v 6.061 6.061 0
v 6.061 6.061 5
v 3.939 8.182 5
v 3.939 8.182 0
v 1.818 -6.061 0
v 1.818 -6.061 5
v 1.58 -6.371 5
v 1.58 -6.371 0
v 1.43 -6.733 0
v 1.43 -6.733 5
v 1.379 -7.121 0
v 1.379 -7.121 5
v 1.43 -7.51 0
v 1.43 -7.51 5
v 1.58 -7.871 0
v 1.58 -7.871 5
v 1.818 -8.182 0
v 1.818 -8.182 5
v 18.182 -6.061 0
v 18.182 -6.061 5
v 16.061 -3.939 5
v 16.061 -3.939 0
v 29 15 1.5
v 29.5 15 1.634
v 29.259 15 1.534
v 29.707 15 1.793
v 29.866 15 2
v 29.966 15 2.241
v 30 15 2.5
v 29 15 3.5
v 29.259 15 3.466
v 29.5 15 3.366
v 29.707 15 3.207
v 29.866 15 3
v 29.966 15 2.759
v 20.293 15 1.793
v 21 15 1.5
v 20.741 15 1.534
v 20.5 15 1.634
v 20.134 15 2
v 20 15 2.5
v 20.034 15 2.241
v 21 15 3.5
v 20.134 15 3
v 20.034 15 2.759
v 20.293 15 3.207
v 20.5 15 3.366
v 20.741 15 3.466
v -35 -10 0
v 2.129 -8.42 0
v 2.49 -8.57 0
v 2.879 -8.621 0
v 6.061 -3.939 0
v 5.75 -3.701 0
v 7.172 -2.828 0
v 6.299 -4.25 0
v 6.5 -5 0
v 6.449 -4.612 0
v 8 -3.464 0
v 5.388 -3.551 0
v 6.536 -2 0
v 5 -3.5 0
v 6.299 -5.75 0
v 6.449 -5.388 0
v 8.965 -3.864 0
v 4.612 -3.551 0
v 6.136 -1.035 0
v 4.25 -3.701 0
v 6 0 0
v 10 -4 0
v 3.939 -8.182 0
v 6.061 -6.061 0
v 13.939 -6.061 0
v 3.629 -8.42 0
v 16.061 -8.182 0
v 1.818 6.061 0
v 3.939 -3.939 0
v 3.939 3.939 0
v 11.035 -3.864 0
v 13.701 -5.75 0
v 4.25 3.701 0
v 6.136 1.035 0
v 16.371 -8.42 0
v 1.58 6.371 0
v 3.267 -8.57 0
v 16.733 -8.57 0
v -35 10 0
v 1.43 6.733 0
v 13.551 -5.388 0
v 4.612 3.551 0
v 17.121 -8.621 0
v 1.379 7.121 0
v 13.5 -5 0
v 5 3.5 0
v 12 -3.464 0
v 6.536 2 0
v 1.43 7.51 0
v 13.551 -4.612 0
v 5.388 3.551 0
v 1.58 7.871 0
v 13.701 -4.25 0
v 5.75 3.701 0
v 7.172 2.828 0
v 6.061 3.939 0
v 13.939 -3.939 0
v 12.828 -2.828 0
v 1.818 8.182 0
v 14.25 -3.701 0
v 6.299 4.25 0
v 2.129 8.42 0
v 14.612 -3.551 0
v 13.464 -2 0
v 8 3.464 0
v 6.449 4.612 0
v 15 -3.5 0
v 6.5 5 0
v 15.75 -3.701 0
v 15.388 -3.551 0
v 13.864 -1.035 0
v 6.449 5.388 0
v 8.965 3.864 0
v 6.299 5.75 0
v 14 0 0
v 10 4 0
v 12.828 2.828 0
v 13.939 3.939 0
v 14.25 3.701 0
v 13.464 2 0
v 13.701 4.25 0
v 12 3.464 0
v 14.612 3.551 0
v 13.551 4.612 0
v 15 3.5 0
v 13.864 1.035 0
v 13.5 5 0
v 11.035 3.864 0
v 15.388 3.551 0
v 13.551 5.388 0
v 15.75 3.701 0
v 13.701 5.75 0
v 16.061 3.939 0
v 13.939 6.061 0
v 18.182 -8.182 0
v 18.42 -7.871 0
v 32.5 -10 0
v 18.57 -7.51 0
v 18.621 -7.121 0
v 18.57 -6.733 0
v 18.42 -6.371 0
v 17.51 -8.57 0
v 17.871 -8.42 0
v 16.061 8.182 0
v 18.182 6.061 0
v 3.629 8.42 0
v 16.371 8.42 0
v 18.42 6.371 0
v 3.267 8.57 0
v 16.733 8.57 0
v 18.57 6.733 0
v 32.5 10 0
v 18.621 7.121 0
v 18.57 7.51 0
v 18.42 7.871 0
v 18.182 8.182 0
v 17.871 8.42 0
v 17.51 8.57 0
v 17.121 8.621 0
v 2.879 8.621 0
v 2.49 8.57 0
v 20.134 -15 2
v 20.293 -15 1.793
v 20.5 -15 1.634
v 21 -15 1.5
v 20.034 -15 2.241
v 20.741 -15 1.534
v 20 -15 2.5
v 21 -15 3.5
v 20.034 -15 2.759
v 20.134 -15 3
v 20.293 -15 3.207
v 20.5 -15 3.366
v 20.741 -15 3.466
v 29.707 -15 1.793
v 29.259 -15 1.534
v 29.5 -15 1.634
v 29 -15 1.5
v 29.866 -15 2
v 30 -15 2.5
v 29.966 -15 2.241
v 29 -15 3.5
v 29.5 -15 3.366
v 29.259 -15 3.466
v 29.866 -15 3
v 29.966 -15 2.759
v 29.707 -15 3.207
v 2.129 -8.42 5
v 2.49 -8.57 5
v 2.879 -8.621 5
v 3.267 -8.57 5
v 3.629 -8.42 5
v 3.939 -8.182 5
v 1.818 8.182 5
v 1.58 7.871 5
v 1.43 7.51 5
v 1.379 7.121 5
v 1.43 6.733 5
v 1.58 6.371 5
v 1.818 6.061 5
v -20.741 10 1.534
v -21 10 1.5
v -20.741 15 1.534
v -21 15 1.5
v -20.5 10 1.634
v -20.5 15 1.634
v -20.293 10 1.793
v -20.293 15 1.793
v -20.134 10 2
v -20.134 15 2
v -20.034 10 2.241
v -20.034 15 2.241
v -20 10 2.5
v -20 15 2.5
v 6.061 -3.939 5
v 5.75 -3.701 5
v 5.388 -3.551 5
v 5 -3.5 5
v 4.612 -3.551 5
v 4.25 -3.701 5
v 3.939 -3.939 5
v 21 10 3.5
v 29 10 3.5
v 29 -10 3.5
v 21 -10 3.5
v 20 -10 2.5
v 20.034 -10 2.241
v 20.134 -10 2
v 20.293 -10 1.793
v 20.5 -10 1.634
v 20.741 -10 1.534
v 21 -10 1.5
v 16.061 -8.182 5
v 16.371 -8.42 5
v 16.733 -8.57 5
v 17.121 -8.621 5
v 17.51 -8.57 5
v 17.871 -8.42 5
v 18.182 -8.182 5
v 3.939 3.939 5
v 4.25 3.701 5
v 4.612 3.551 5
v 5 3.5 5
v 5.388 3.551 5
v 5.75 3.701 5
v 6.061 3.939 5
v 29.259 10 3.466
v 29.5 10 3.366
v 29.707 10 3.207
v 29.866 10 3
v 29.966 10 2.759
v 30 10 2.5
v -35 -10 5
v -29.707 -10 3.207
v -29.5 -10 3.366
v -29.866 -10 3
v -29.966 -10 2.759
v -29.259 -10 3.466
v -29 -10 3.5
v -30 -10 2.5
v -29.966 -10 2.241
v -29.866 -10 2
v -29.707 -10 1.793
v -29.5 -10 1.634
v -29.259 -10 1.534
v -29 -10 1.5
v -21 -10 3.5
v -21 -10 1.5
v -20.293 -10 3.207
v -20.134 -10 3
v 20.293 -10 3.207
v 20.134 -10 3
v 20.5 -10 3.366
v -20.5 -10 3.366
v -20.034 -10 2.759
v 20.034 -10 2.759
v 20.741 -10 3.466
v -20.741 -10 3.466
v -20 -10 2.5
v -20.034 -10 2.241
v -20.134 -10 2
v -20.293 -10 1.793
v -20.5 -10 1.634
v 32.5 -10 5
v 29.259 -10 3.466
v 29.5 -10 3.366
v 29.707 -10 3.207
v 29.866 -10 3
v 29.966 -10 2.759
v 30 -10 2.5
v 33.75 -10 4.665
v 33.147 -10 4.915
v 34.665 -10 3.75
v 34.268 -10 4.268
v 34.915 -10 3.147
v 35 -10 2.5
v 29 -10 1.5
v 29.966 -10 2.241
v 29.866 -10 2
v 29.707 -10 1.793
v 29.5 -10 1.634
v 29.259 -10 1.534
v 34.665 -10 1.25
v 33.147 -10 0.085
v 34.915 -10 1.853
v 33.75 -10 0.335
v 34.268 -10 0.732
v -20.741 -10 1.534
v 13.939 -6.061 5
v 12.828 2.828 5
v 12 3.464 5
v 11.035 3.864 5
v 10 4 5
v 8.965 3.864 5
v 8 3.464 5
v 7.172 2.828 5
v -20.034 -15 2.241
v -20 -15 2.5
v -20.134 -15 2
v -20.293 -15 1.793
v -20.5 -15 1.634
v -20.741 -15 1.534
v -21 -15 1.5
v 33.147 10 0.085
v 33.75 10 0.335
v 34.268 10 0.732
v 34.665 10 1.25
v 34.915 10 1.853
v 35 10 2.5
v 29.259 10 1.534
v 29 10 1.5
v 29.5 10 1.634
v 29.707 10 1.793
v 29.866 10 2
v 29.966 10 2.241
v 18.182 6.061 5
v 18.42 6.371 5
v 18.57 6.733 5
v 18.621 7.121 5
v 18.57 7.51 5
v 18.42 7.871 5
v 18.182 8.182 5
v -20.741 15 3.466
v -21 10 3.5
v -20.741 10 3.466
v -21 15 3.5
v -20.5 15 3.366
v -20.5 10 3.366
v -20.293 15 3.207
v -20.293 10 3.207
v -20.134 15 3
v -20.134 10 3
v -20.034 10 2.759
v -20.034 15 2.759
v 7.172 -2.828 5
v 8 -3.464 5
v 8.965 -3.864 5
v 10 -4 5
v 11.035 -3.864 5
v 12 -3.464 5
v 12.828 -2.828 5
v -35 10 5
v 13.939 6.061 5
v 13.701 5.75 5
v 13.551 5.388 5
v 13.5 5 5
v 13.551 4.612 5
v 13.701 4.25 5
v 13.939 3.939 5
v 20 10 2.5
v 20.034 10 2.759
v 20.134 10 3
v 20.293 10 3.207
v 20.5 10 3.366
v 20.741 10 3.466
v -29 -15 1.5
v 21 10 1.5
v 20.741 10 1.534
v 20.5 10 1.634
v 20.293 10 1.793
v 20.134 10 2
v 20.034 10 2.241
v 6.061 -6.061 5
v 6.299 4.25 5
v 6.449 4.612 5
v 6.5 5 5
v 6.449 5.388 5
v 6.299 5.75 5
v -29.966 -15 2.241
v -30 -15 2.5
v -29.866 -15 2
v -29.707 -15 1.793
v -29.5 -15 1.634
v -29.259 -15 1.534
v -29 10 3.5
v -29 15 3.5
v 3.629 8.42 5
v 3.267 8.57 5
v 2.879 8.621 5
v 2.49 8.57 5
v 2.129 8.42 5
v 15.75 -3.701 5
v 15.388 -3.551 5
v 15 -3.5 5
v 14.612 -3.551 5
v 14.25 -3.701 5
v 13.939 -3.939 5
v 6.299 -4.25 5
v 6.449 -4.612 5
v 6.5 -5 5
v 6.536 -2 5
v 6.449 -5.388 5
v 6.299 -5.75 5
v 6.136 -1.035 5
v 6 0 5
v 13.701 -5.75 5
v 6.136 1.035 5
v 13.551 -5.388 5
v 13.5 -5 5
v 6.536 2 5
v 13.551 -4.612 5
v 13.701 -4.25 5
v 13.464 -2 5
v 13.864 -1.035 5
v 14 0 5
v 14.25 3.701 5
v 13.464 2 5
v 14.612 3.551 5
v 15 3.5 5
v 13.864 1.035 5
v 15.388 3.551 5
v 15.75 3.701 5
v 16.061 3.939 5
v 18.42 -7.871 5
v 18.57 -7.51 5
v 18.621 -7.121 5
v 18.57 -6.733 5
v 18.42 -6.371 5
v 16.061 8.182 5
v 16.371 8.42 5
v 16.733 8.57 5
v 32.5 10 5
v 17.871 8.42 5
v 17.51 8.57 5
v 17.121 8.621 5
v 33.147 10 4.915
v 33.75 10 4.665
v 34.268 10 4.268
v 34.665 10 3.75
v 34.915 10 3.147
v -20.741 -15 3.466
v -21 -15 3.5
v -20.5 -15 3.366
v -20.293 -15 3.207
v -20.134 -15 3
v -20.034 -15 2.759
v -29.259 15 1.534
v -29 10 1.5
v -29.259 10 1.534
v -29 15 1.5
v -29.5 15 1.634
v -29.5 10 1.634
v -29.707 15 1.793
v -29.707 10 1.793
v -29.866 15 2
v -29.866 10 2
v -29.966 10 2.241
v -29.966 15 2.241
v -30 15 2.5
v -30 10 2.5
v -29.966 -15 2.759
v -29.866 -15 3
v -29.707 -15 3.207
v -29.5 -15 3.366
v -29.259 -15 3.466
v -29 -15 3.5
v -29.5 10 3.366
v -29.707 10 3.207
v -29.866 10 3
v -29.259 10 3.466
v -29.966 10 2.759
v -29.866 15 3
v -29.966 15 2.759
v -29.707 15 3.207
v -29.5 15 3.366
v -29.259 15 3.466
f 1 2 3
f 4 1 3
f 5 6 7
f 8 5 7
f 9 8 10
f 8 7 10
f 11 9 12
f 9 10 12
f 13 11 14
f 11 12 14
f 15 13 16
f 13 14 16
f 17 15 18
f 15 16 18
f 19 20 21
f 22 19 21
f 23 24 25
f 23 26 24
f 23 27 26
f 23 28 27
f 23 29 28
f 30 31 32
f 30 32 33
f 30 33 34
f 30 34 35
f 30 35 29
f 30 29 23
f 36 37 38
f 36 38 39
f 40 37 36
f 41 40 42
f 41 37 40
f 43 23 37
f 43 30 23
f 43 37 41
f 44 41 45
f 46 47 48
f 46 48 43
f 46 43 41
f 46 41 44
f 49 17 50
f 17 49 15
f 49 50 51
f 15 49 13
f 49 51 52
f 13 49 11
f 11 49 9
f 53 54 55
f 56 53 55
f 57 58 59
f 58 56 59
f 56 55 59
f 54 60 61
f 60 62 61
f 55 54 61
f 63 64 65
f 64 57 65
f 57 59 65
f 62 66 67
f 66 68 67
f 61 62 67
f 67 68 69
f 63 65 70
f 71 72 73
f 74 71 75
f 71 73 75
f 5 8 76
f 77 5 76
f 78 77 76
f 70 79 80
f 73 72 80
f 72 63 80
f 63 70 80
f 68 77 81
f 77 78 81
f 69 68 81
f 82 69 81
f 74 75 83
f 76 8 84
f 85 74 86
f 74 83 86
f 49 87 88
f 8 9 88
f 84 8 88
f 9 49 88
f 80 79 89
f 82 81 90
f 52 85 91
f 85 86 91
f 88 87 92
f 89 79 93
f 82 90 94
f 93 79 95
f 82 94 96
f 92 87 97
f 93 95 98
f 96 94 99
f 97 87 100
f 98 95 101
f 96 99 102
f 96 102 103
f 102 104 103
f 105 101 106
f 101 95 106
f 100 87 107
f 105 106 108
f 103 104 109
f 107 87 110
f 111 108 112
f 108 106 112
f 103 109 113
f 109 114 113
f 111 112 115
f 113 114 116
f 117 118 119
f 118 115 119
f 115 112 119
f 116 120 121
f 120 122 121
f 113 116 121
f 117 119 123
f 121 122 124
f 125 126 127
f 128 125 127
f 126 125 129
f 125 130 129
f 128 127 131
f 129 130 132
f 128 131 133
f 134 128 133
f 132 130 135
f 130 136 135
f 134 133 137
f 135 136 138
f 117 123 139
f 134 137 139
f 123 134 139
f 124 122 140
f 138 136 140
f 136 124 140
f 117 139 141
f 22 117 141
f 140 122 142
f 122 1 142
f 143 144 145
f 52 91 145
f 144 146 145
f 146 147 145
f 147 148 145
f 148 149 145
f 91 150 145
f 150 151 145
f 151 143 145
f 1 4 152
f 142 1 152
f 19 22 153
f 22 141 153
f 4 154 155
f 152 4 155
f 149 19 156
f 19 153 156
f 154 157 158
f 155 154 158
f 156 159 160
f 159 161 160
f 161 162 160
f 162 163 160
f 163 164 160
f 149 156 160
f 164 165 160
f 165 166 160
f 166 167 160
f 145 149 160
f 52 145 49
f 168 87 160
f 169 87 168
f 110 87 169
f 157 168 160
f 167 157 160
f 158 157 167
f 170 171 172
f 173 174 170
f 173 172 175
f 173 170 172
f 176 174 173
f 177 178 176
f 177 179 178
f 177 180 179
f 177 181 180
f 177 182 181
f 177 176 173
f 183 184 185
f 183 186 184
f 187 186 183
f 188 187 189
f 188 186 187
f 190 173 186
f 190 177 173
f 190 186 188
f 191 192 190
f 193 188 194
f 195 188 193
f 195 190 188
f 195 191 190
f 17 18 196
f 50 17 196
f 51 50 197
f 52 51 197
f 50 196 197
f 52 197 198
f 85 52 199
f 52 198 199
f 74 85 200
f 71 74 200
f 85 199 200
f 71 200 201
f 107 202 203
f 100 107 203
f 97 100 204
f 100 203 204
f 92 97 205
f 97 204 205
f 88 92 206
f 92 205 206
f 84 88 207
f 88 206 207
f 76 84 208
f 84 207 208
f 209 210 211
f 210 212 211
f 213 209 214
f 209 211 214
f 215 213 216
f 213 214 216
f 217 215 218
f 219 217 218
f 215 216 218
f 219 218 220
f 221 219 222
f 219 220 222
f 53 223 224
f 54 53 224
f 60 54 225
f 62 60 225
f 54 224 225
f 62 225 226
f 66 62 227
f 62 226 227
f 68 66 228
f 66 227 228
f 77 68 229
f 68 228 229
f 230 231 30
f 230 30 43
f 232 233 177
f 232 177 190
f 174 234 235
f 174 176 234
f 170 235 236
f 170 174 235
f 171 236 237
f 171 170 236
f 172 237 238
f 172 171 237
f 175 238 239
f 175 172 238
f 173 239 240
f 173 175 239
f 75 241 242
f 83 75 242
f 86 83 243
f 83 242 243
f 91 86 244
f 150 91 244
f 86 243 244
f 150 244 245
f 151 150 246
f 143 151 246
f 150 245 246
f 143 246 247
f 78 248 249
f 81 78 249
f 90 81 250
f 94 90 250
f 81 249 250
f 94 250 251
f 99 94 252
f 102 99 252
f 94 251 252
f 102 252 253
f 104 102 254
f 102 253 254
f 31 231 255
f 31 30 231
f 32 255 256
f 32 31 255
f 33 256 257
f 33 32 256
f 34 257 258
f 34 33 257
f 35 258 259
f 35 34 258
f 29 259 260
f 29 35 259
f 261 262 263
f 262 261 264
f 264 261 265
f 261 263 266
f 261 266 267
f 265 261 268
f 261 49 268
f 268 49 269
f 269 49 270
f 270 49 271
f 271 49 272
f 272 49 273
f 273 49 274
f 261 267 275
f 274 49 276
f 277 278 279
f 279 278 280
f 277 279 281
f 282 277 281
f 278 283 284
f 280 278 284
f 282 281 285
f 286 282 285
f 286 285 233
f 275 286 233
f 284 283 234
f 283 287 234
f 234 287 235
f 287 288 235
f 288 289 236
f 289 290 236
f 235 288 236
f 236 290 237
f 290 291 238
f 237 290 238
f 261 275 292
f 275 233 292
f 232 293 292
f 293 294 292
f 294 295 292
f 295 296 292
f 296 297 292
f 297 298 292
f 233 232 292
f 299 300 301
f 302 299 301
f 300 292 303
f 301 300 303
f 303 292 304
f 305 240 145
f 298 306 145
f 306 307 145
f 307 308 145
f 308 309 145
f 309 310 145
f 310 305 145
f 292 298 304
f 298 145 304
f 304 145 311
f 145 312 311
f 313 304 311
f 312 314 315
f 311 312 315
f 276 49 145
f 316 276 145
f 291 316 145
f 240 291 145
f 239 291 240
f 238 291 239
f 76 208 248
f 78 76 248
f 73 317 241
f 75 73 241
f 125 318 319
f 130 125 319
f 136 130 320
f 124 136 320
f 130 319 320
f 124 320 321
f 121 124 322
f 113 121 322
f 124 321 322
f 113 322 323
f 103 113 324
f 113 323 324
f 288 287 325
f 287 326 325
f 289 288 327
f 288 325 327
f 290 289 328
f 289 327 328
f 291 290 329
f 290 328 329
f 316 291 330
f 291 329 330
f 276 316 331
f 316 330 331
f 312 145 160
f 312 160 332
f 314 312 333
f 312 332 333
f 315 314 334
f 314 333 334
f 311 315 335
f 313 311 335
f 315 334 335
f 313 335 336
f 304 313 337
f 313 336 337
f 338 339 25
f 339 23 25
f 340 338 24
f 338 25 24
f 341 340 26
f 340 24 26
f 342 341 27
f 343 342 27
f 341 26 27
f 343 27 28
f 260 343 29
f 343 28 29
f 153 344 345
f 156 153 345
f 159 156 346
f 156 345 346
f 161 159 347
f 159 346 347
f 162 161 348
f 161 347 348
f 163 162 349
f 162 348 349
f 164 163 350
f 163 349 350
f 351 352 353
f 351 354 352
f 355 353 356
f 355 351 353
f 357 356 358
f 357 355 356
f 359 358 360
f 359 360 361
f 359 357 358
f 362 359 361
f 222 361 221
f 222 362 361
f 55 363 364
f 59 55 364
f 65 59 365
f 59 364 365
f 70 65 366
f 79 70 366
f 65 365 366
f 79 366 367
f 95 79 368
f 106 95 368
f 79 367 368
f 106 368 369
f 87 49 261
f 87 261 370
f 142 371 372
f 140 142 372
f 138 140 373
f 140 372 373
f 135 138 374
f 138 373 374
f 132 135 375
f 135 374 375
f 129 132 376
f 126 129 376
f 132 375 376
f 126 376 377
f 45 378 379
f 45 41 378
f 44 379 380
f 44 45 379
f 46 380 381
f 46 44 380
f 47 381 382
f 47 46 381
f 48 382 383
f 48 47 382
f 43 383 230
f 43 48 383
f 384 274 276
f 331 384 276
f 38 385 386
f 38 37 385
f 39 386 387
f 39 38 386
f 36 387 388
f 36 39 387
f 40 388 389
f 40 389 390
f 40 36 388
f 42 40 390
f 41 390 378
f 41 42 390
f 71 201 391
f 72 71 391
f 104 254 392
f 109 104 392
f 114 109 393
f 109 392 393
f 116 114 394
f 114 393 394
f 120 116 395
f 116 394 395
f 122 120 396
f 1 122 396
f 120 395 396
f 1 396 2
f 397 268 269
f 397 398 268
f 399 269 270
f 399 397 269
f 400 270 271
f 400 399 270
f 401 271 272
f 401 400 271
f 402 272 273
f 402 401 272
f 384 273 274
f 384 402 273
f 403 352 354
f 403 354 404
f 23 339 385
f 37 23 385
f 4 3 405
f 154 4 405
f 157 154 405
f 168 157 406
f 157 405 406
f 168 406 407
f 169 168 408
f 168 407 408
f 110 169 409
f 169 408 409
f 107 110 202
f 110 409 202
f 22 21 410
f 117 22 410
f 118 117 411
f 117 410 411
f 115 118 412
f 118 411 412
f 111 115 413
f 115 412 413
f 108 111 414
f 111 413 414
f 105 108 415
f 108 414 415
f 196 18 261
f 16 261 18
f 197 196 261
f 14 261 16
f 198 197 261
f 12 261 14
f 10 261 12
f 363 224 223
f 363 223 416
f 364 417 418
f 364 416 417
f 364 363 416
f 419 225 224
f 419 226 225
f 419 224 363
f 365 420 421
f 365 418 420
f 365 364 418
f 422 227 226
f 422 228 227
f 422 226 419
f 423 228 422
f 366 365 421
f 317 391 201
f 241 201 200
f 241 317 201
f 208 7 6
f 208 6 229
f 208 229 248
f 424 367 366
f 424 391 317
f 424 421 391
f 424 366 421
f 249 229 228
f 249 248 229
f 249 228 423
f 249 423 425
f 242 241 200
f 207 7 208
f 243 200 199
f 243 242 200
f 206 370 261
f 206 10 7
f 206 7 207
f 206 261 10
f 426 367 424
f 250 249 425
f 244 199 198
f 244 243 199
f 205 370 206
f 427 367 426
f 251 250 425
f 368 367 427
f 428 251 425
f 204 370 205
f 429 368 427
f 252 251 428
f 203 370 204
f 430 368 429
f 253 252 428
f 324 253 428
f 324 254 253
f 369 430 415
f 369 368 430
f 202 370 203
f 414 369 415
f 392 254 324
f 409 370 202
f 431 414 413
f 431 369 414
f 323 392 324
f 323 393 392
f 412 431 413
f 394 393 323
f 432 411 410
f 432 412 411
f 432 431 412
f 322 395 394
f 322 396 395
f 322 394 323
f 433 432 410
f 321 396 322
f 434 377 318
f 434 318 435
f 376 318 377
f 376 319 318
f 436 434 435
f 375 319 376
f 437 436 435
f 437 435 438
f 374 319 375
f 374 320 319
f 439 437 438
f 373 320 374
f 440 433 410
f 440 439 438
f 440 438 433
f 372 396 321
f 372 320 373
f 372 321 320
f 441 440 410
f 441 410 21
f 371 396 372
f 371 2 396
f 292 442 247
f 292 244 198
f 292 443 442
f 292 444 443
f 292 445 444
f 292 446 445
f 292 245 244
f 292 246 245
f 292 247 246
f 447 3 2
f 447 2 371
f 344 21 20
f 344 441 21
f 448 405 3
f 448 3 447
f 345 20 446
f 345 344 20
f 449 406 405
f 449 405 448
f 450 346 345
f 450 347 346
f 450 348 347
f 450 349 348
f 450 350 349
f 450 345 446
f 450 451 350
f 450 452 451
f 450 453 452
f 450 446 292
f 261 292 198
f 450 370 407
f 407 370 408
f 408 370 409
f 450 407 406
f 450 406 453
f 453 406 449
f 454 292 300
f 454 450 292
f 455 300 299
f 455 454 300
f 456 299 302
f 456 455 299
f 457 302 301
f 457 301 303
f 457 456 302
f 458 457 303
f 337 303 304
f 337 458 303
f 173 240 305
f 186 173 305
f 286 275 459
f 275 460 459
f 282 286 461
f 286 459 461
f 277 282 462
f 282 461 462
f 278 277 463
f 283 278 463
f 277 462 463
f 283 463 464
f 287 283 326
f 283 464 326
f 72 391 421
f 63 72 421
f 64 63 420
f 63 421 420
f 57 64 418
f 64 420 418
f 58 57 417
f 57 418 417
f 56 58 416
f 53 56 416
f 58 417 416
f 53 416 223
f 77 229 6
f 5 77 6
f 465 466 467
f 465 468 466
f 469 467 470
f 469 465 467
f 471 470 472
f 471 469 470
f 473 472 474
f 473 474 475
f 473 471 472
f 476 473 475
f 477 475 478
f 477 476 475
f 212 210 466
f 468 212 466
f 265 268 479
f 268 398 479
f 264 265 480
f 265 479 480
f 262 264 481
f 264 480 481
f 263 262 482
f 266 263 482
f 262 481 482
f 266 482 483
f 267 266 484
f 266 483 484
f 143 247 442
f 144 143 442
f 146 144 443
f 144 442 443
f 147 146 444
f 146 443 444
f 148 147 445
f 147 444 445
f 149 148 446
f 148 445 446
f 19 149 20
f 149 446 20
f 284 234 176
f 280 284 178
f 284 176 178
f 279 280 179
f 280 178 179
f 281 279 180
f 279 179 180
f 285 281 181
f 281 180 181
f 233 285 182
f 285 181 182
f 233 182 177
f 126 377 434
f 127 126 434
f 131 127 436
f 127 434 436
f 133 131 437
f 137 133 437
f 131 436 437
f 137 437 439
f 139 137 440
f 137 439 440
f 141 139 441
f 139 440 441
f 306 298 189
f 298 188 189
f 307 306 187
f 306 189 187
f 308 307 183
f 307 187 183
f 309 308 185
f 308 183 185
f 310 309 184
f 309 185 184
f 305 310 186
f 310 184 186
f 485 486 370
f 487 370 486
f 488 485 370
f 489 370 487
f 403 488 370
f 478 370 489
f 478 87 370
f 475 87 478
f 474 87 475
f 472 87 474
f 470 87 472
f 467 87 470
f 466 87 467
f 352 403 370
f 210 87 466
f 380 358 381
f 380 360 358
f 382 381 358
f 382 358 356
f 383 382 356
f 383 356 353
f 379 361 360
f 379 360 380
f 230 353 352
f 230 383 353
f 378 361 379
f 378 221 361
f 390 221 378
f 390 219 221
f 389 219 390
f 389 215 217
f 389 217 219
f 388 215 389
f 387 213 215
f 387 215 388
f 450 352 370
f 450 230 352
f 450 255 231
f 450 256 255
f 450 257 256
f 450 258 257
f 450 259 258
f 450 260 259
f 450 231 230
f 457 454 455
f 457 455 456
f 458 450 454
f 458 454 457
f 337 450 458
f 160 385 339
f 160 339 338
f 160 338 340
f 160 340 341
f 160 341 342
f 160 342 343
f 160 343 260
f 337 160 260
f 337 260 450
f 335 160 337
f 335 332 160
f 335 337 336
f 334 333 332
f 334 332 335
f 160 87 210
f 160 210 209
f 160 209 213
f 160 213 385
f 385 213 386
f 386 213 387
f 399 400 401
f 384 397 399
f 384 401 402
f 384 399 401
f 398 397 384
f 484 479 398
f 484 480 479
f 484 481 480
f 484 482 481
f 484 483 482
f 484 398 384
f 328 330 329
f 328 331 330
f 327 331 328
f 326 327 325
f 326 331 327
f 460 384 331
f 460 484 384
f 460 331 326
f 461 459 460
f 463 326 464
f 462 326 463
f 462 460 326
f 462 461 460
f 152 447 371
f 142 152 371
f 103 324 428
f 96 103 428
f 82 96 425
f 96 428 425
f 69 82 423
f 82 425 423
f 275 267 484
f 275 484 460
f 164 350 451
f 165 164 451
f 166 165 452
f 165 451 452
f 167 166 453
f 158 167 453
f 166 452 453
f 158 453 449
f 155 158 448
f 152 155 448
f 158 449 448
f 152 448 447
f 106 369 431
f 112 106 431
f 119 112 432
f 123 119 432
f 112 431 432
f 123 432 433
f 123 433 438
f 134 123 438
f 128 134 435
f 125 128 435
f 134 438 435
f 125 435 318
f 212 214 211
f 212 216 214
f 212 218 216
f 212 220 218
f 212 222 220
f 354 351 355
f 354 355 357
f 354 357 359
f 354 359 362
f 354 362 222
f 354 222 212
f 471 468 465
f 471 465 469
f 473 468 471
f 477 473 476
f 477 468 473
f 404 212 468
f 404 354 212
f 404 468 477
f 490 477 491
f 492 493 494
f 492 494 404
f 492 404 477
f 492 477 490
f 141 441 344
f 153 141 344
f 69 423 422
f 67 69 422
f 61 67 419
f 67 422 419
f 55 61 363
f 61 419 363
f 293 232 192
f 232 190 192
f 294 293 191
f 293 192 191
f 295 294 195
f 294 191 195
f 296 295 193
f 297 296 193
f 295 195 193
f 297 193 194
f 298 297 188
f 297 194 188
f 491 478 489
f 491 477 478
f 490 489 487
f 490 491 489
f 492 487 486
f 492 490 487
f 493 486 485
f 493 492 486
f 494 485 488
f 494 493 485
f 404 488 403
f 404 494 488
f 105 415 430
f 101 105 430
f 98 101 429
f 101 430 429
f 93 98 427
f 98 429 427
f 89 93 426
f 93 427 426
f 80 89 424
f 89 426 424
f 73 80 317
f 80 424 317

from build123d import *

# Parameters (mm, degrees)
F0_W     = 70
F0_H     = 20
F1_DEPTH = 5
F2_W     = 10
F2_H     = 2
F3_DEPTH = 5
F4_W     = 10
F4_H     = 2
F5_DEPTH = 5
F6_R     = 0.99999
F7_R     = 2.49999
F9_DEPTH = 5


# Not quite as in the source:
# - a fillet or chamfer is up to 0.001 mm smaller than in the source, because OpenCascade refuses the exact size


with BuildPart() as f1:
    # F0 (on Top) → F1 (new body)
    with BuildSketch(Plane.XY):
        Rectangle(F0_W, F0_H)
    extrude(amount=F1_DEPTH)

    # F2 (on face) → F3 (join)
    with BuildSketch(Plane.XZ.offset(10)):
        with Locations((-25, 2.5)):
            Rectangle(F2_W, F2_H)
        with Locations((25, 2.5)):
            Rectangle(F2_W, F2_H)
    extrude(amount=F3_DEPTH)

    # F4 (on face) → F5 (join)
    with BuildSketch(Plane(origin=(0, 10, 0), x_dir=(-1, 0, 0), z_dir=(0, 1, 0))):
        with Locations((-25, 2.5)):
            Rectangle(F4_W, F4_H)
        with Locations((25, 2.5)):
            Rectangle(F4_W, F4_H)
    extrude(amount=F5_DEPTH)

    # F6 (radius 1 in the source; OpenCascade refuses exactly that, so slightly less here)
    f6_edges = [f1.edges().sort_by_distance(p)[0] for p in [
        (30, 12.5, 3.5),
        (30, 12.5, 1.5),
        (20, 12.5, 3.5),
        (30, -12.5, 3.5),
        (30, -12.5, 1.5),
        (20, -12.5, 3.5),
        (-20, 12.5, 3.5),
        (-20, 12.5, 1.5),
        (-30, -12.5, 3.5),
        (-20, -12.5, 3.5),
        (-20, -12.5, 1.5),
        (-30, 12.5, 3.5),
        (20, 12.5, 1.5),
        (-30, 12.5, 1.5),
        (-30, -12.5, 1.5),
        (20, -12.5, 1.5),
    ]]
    fillet(f6_edges, radius=F6_R)

    # F7 (radius 2.5 in the source; OpenCascade refuses exactly that, so slightly less here)
    f7_edges = [f1.edges().sort_by_distance(p)[0] for p in [
        (35, 0, 5),
        (35, 0, 0),
    ]]
    fillet(f7_edges, radius=F7_R)

    # F8 (on face) → F9 (cut)
    with BuildSketch(Plane.XY.offset(5)):
        with BuildLine():
            Line((6.0606601718, -3.9393398282), (1.8180194847, -8.1819805153))
            ThreePointArc((1.8180194847, -8.1819805153), (2.8786796564, -8.6213203436), (3.9393398282, -8.1819805153))
            Line((3.9393398282, -8.1819805153), (6.0606601718, -6.0606601718))
            ThreePointArc((6.0606601718, -6.0606601718), (6.5, -5), (6.0606601718, -3.9393398282))
        make_face()
        with BuildLine():
            ThreePointArc((1.8180194847, -6.0606601718), (1.3786796564, -7.1213203436), (1.8180194847, -8.1819805153))
            Line((1.8180194847, -8.1819805153), (6.0606601718, -3.9393398282))
            ThreePointArc((6.0606601718, -3.9393398282), (5, -3.5), (3.9393398282, -3.9393398282))
            Line((3.9393398282, -3.9393398282), (1.8180194847, -6.0606601718))
        make_face()
        with BuildLine():
            ThreePointArc((7.1715728753, 2.8284271247), (6.30448187, 1.5307337295), (6, 0))
            Line((6, 0), (10, 0))
            Line((10, 0), (7.1715728753, 2.8284271247))
        make_face()
        with BuildLine():
            Line((10, 0), (6, 0))
            ThreePointArc((6, 0), (6.30448187, -1.5307337295), (7.1715728753, -2.8284271247))
            Line((7.1715728753, -2.8284271247), (10, 0))
        make_face()
        with BuildLine():
            Line((12.8284271247, -2.8284271247), (10, 0))
            Line((10, 0), (7.1715728753, -2.8284271247))
            ThreePointArc((7.1715728753, -2.8284271247), (10, -4), (12.8284271247, -2.8284271247))
        make_face()
        with BuildLine():
            Line((13.9393398282, -3.9393398282), (18.1819805153, -8.1819805153))
            ThreePointArc((18.1819805153, -8.1819805153), (18.6213203436, -7.1213203436), (18.1819805153, -6.0606601718))
            Line((18.1819805153, -6.0606601718), (16.0606601718, -3.9393398282))
            ThreePointArc((16.0606601718, -3.9393398282), (15, -3.5), (13.9393398282, -3.9393398282))
        make_face()
        with BuildLine():
            ThreePointArc((16.0606601718, -8.1819805153), (17.1213203436, -8.6213203436), (18.1819805153, -8.1819805153))
            Line((18.1819805153, -8.1819805153), (13.9393398282, -3.9393398282))
            ThreePointArc((13.9393398282, -3.9393398282), (13.5, -5), (13.9393398282, -6.0606601718))
            Line((13.9393398282, -6.0606601718), (16.0606601718, -8.1819805153))
        make_face()
        with BuildLine():
            ThreePointArc((18.1819805153, 6.0606601718), (18.6213203436, 7.1213203436), (18.1819805153, 8.1819805153))
            ThreePointArc((18.1819805153, 8.1819805153), (17.1213203436, 8.6213203436), (16.0606601718, 8.1819805153))
            Line((16.0606601718, 8.1819805153), (13.9393398282, 6.0606601718))
            ThreePointArc((13.9393398282, 6.0606601718), (13.5, 5), (13.9393398282, 3.9393398282))
            ThreePointArc((13.9393398282, 3.9393398282), (15, 3.5), (16.0606601718, 3.9393398282))
            Line((16.0606601718, 3.9393398282), (18.1819805153, 6.0606601718))
        make_face()
        with BuildLine():
            ThreePointArc((3.9393398282, 8.1819805153), (2.8786796564, 8.6213203436), (1.8180194847, 8.1819805153))
            ThreePointArc((1.8180194847, 8.1819805153), (1.3786796564, 7.1213203436), (1.8180194847, 6.0606601718))
            Line((1.8180194847, 6.0606601718), (3.9393398282, 3.9393398282))
            ThreePointArc((3.9393398282, 3.9393398282), (5, 3.5), (6.0606601718, 3.9393398282))
            ThreePointArc((6.0606601718, 3.9393398282), (6.5, 5), (6.0606601718, 6.0606601718))
            Line((6.0606601718, 6.0606601718), (3.9393398282, 8.1819805153))
        make_face()
        with BuildLine():
            Line((7.1715728753, 2.8284271247), (10, 0))
            Line((10, 0), (12.8284271247, 2.8284271247))
            ThreePointArc((12.8284271247, 2.8284271247), (10, 4), (7.1715728753, 2.8284271247))
        make_face()
        with BuildLine():
            Line((12.8284271247, 2.8284271247), (10, 0))
            Line((10, 0), (14, 0))
            ThreePointArc((14, 0), (13.69551813, 1.5307337295), (12.8284271247, 2.8284271247))
        make_face()
        with BuildLine():
            Line((14, 0), (10, 0))
            Line((10, 0), (12.8284271247, -2.8284271247))
            ThreePointArc((12.8284271247, -2.8284271247), (13.69551813, -1.5307337295), (14, 0))
        make_face()
    extrude(amount=-F9_DEPTH, mode=Mode.SUBTRACT)


solid = f1.part
